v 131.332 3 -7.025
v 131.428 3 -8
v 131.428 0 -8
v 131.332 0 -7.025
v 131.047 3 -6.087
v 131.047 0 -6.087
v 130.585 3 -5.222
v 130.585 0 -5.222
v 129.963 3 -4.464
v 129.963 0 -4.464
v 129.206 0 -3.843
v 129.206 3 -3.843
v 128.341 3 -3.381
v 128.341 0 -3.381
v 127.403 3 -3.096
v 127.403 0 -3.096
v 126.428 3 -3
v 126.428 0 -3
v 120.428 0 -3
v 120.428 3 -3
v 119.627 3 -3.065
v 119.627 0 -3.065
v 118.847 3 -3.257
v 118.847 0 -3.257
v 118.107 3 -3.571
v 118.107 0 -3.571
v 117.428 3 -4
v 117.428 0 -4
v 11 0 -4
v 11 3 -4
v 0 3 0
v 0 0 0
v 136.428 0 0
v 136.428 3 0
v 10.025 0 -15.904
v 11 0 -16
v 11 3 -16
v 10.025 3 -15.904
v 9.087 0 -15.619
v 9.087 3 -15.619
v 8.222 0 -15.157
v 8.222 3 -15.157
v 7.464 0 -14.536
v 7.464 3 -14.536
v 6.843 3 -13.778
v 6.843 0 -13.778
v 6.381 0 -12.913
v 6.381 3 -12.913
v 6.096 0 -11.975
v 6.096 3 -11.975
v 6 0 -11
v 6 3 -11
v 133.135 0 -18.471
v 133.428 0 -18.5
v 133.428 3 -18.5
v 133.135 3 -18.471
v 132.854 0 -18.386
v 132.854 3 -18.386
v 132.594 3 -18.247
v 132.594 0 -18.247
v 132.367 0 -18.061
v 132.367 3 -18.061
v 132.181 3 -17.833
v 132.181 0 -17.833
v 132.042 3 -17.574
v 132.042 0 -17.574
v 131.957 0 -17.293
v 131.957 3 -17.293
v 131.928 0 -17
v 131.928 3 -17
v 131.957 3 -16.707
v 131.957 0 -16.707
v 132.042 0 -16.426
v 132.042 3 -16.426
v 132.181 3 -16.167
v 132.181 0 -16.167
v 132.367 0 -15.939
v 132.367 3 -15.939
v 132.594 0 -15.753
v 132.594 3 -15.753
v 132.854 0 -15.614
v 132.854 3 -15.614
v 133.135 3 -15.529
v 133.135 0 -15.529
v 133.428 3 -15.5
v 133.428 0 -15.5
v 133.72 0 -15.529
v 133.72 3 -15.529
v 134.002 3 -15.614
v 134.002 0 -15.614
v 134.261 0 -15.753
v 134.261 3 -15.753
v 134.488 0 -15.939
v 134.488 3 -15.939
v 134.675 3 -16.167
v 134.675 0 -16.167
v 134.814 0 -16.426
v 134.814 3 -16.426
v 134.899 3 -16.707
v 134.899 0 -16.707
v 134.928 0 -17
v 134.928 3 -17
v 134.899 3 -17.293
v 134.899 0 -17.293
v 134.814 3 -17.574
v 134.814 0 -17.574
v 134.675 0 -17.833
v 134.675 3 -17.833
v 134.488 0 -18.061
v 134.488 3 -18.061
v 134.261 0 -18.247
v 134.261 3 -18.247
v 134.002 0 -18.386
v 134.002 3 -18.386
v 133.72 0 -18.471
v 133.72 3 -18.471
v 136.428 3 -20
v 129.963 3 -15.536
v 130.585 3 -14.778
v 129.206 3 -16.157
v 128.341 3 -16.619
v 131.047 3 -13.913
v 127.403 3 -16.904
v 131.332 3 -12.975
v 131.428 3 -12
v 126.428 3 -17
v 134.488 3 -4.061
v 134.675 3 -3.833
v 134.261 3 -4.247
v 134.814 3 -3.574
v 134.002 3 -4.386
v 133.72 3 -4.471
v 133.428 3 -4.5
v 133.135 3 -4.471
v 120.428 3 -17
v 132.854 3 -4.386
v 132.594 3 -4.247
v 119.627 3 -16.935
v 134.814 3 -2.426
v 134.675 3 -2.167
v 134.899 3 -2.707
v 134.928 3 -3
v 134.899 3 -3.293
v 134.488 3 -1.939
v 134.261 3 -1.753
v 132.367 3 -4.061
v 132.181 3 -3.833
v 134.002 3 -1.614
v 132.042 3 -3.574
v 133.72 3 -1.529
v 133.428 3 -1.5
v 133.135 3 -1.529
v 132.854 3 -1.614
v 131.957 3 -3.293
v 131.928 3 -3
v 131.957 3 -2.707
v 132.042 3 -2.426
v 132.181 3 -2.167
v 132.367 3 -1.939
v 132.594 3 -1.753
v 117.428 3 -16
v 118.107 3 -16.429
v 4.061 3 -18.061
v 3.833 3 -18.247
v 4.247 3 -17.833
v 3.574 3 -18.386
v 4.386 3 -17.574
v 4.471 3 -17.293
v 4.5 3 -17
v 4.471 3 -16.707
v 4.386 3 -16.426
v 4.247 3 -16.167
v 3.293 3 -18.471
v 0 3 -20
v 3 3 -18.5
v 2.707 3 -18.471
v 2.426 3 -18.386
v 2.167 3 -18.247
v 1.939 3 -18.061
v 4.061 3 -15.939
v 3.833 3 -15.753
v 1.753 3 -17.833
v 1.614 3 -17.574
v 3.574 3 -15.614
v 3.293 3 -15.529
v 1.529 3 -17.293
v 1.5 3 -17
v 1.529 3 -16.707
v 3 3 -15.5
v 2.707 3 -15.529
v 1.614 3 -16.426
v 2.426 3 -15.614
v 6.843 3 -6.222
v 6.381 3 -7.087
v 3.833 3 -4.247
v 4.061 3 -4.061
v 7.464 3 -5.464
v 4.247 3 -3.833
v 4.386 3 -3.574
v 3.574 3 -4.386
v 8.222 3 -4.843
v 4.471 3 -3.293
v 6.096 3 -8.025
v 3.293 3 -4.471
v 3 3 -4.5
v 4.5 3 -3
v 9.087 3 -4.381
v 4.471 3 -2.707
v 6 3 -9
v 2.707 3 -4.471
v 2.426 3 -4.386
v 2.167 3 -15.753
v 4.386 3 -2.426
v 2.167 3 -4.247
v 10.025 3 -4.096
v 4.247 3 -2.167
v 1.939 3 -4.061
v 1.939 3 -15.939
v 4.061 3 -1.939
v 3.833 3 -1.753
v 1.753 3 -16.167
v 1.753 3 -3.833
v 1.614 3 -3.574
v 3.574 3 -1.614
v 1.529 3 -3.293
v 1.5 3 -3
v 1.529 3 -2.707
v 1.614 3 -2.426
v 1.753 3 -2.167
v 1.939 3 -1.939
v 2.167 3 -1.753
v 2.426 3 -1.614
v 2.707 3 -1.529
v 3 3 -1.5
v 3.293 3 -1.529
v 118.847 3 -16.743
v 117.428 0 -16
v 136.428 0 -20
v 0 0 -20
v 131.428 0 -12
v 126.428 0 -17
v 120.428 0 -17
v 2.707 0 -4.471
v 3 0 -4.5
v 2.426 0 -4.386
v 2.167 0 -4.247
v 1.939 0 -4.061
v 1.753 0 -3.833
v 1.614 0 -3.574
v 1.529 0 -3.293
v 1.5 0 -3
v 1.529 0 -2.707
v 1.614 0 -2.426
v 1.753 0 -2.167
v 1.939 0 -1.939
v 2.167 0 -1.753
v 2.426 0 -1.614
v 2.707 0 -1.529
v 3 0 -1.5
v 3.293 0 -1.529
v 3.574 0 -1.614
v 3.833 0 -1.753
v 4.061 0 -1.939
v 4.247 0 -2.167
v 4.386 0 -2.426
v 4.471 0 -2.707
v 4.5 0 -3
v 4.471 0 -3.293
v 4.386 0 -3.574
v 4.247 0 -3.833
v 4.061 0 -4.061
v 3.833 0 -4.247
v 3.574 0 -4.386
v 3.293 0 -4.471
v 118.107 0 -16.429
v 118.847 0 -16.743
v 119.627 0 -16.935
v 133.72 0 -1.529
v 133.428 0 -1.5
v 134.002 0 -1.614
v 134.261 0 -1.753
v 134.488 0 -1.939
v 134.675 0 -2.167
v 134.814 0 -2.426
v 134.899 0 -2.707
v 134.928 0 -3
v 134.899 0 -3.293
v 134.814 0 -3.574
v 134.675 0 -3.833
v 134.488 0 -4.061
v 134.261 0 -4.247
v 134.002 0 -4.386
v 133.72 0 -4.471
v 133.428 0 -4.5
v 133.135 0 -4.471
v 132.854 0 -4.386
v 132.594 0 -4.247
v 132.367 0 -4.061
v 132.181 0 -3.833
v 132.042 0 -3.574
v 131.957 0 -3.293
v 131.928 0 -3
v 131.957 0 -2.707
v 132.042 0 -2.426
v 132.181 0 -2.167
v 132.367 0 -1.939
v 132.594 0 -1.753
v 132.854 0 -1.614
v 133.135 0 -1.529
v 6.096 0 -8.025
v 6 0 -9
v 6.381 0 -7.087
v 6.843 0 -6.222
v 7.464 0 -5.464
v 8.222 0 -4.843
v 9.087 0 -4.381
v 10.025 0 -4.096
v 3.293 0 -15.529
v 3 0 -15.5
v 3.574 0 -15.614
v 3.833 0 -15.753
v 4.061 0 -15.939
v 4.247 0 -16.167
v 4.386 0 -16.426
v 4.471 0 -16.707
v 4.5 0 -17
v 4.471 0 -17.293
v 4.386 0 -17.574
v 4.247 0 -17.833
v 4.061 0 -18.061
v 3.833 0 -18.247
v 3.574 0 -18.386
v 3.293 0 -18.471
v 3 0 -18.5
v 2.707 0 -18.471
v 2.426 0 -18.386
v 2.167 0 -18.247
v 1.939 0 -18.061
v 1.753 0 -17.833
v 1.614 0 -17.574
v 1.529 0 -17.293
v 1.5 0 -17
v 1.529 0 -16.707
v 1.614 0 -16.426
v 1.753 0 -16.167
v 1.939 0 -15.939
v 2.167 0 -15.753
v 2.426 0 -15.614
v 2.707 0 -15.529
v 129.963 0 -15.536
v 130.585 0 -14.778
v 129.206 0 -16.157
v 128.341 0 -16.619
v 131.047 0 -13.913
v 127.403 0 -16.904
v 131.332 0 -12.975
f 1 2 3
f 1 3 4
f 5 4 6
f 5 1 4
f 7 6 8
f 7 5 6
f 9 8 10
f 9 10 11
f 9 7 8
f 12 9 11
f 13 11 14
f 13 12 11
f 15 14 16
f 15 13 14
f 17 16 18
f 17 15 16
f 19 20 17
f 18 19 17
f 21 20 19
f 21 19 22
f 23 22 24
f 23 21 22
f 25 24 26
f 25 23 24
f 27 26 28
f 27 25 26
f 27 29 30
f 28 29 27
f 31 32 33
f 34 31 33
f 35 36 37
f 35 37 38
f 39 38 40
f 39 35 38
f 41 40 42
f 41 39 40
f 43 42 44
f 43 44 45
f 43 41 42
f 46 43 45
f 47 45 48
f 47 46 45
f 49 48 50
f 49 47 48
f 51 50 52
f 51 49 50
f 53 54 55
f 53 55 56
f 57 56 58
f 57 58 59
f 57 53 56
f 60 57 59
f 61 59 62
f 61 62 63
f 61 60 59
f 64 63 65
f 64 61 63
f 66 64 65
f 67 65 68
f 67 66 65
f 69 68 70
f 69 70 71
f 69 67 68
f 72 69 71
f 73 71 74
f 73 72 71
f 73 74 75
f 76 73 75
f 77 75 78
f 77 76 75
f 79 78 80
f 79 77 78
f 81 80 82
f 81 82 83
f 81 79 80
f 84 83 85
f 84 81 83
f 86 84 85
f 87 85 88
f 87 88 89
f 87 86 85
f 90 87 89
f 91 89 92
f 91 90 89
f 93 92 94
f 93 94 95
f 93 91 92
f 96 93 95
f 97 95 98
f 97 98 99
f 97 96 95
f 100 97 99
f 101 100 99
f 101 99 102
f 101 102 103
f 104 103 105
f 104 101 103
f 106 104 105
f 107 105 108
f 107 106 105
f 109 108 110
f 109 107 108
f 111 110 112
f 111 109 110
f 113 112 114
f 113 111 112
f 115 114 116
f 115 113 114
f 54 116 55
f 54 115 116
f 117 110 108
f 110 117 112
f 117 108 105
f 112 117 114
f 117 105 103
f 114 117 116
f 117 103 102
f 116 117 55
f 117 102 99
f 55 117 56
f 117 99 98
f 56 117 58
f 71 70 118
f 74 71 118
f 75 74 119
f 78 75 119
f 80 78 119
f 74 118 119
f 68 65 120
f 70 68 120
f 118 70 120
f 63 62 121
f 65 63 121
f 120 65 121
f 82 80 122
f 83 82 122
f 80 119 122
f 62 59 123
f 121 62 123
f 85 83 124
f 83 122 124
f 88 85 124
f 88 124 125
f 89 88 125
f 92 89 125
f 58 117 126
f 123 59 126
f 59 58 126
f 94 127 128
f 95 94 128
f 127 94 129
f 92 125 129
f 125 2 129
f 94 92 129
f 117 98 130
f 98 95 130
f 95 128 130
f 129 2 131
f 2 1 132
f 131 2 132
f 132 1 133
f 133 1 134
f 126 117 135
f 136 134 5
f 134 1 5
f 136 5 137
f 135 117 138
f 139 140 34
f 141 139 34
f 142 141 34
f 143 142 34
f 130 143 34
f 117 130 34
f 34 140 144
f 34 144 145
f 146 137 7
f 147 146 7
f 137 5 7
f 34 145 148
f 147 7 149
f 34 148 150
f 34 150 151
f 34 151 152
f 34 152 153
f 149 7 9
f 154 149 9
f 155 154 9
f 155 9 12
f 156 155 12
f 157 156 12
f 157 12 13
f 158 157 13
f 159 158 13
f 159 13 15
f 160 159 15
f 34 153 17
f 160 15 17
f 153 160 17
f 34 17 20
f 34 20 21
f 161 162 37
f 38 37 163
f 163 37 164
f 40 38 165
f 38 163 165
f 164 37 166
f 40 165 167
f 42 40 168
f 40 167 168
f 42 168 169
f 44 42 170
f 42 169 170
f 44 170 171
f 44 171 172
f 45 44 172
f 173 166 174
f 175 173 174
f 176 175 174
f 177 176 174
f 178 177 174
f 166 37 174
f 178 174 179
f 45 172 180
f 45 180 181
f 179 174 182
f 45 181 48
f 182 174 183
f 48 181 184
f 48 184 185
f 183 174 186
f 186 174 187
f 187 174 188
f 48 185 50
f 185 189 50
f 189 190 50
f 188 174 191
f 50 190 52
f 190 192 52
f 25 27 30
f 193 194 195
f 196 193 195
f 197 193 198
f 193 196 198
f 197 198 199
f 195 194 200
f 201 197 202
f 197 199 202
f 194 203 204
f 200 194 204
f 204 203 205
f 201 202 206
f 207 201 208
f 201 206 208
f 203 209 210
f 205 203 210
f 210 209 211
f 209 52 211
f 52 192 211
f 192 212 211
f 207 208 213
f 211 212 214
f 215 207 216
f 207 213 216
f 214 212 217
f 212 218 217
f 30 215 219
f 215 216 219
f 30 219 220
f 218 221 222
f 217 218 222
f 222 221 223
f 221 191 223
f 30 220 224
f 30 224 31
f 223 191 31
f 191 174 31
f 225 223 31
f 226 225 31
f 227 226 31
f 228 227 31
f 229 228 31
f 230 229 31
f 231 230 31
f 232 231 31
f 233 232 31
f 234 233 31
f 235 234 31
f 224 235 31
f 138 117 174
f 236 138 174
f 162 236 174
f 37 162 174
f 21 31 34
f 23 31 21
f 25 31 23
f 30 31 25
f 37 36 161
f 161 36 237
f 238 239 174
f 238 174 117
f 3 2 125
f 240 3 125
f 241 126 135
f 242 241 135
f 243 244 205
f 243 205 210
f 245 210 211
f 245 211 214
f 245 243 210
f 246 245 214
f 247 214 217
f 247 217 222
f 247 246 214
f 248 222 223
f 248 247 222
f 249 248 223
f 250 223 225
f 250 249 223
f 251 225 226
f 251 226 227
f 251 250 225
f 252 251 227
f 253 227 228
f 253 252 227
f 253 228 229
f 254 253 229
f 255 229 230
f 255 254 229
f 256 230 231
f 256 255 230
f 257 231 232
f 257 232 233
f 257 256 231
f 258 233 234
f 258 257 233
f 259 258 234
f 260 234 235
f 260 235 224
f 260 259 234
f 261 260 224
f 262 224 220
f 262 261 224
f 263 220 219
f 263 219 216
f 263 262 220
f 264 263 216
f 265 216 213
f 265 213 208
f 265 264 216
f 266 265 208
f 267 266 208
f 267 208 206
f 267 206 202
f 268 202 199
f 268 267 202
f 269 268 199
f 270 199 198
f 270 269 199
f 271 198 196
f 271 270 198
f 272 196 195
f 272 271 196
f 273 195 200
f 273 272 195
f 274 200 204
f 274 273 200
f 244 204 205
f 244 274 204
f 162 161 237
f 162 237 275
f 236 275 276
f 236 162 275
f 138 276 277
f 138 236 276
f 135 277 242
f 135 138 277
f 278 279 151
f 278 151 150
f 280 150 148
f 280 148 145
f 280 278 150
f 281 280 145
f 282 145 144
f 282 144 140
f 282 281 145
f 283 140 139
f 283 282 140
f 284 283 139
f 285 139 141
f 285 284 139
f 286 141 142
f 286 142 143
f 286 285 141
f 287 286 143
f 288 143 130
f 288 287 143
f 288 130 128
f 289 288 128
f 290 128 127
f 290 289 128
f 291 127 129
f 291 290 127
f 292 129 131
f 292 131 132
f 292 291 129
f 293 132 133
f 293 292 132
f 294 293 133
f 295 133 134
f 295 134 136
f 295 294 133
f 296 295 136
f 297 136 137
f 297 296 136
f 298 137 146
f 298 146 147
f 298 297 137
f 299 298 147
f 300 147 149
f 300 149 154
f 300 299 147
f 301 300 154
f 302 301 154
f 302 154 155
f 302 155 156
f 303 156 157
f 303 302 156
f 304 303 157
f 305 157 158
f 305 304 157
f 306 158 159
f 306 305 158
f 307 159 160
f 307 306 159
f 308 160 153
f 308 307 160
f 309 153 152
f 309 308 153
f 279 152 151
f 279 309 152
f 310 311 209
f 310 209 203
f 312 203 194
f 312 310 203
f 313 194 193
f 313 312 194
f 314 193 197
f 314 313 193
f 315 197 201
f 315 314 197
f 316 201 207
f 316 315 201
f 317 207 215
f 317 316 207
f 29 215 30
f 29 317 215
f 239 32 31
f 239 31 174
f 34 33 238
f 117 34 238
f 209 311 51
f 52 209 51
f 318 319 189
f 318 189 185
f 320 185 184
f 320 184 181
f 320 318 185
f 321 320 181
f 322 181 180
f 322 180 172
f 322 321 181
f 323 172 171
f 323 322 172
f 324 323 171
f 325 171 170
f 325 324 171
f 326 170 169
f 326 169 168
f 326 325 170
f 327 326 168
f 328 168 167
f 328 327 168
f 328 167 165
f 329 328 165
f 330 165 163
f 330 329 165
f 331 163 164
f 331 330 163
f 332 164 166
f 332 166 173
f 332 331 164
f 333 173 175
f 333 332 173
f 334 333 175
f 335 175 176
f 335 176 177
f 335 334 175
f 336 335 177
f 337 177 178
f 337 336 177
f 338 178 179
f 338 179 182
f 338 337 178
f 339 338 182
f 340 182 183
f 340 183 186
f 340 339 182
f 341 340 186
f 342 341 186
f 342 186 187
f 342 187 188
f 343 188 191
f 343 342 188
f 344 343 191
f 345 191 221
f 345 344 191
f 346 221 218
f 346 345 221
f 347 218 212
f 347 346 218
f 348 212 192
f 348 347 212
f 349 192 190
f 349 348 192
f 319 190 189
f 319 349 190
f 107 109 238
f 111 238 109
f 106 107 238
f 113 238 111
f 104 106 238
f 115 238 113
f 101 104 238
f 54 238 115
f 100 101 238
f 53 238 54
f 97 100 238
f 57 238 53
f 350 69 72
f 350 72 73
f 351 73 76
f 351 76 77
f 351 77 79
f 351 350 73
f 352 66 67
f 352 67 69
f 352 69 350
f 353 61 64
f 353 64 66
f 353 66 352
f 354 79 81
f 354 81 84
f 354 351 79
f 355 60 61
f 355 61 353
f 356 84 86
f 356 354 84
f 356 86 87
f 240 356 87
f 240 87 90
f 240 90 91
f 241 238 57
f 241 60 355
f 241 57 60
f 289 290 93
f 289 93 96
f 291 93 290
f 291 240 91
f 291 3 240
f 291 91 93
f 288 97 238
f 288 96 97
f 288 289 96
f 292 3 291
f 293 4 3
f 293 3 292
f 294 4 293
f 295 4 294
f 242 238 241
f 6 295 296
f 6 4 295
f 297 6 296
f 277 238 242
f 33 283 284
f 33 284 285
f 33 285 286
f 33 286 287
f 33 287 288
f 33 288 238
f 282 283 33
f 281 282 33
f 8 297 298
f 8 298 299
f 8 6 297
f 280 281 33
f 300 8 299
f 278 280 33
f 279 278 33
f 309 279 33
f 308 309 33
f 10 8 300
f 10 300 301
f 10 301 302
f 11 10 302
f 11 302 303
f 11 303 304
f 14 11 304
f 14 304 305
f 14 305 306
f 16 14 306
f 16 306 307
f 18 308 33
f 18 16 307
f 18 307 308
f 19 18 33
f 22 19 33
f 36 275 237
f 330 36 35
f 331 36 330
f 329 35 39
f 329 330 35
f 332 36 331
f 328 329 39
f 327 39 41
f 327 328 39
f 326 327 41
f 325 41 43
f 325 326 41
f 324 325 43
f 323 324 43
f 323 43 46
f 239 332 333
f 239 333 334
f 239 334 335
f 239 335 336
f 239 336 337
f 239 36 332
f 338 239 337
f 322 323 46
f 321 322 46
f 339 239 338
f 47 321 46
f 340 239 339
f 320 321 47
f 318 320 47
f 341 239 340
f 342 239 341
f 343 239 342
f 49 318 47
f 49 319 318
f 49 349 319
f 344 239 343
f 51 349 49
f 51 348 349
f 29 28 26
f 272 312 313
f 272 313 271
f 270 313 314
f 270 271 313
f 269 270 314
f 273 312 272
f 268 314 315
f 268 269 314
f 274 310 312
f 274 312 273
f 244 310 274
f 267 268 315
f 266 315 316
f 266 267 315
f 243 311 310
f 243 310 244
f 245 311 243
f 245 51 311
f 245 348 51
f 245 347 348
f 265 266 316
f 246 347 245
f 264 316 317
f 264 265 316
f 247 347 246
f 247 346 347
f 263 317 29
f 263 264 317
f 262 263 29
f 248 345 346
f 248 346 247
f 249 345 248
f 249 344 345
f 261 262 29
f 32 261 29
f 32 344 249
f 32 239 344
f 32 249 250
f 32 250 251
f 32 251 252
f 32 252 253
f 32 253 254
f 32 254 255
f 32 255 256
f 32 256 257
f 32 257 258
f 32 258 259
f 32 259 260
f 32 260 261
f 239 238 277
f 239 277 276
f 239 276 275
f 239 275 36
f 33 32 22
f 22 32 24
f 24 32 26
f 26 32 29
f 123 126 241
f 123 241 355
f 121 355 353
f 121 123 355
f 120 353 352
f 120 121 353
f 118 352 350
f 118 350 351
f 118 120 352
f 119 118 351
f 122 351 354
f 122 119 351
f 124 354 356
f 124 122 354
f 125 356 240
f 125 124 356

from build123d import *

# Parameters (mm, degrees)
SKETCH1_W           = 136.427821805
SKETCH1_H           = 20
SKETCH1_R           = 1.5
SKETCH1_W_2         = 124.427821805
SKETCH1_H_2         = 12
BOSS_EXTRUDE1_DEPTH = 3
CUT_EXTRUDE1_DEPTH  = 138.918637473
FILLET1_R           = 5


with BuildPart() as part:
    # Sketch1 → Boss-Extrude1 (new body)
    with BuildSketch(Plane(origin=(0, 0, 0), x_dir=(1, 0, 0), z_dir=(0, 1, 0))):
        with Locations((68.213910903, 10)):
            Rectangle(SKETCH1_W, SKETCH1_H)
        with Locations(Location((3, 17, 0), (0, 0, 270))):
            Circle(SKETCH1_R, mode=Mode.SUBTRACT)
        with Locations(Location((3, 3, 0), (0, 0, 90))):
            Circle(SKETCH1_R, mode=Mode.SUBTRACT)
        with Locations(Location((133.427821805, 3, 0), (0, 0, 270))):
            Circle(SKETCH1_R, mode=Mode.SUBTRACT)
        with Locations(Location((133.427821805, 17, 0), (0, 0, 90))):
            Circle(SKETCH1_R, mode=Mode.SUBTRACT)
        with Locations((68.213910903, 10)):
            Rectangle(SKETCH1_W_2, SKETCH1_H_2, mode=Mode.SUBTRACT)
    extrude(amount=BOSS_EXTRUDE1_DEPTH)

    # Sketch2 → Cut-Extrude1 (cut, through all)
    with BuildSketch(Plane(origin=(0, 3, 0), x_dir=(1, 0, 0), z_dir=(0, 1, 0))):
        Polygon((117.427821805, 17), (117.427821805, 16), (130.427821805, 16), (130.427821805, 4), (117.427821805, 4), (117.427821805, 3), (131.427821805, 3), (131.427821805, 17), align=None)
    extrude(amount=-CUT_EXTRUDE1_DEPTH, mode=Mode.SUBTRACT)

    # Fillet1
    # the kernel refuses this fillet: 5 mm, written as the material it adds along each edge
    with BuildSketch(Plane(origin=(131.427821805, 3, -17), x_dir=(0, 0, 1), z_dir=(0, -1, 0)), Plane(origin=(131.427821805, 3, -3), x_dir=(-1, 0, 0), z_dir=(0, -1, 0)), Plane(origin=(6, 0, -16), x_dir=(0, 0, 1), z_dir=(0, 1, 0))) as fillet1_piece_1:
        with BuildLine():
            CenterArc((FILLET1_R, FILLET1_R), FILLET1_R, 180, 90)
            Line((0, FILLET1_R), (-FILLET1_R * 0.02, FILLET1_R))
            Line((-FILLET1_R * 0.02, FILLET1_R), (-FILLET1_R * 0.02, -FILLET1_R * 0.02))
            Line((-FILLET1_R * 0.02, -FILLET1_R * 0.02), (FILLET1_R, -FILLET1_R * 0.02))
            Line((FILLET1_R, -FILLET1_R * 0.02), (FILLET1_R, 0))
        make_face()
    extrude(amount=3)
    with BuildSketch(Plane(origin=(117.427821805, 3, -17), x_dir=(1, 0, 0), z_dir=(0, -1, 0))) as fillet1_piece_2:
        with BuildLine():
            CenterArc((3, 5), FILLET1_R, 233.130102354, 36.869897646)
            Line((0, 1), (-0.06, 0.92))
            ThreePointArc((-0.06, 0.92), (-0.1, 0.5), (-0.1, 0))
            Line((-0.1, 0), (0, -0.1))
            Line((0, -0.1), (3, -0.1))
            Line((3, -0.1), (3, 0))
        make_face()
    extrude(amount=3)
    with BuildSketch(Plane(origin=(117.427821805, 3, -3), x_dir=(0, 0, -1), z_dir=(0, -1, 0))) as fillet1_piece_3:
        with BuildLine():
            CenterArc((5, 3), FILLET1_R, 180, 36.869897646)
            Line((0, 3), (-0.1, 3))
            Line((-0.1, 3), (-0.1, 0))
            Line((-0.1, 0), (0, -0.1))
            ThreePointArc((0, -0.1), (0.5, -0.1), (0.92, -0.06))
            Line((0.92, -0.06), (1, 0))
        make_face()
    extrude(amount=3)
    with BuildSketch(Plane(origin=(6, 0, -4), x_dir=(0, 0, -1), z_dir=(0, 1, 0))) as fillet1_piece_4:
        with BuildLine():
            CenterArc((FILLET1_R, -FILLET1_R), FILLET1_R, 90, 90)
            Line((0, -FILLET1_R), (-FILLET1_R * 0.02, -FILLET1_R))
            Line((-FILLET1_R * 0.02, -FILLET1_R), (-FILLET1_R * 0.02, FILLET1_R * 0.02))
            Line((-FILLET1_R * 0.02, FILLET1_R * 0.02), (FILLET1_R, FILLET1_R * 0.02))
            Line((FILLET1_R, FILLET1_R * 0.02), (FILLET1_R, 0))
        make_face()
    extrude(amount=3)


solid = part.part
